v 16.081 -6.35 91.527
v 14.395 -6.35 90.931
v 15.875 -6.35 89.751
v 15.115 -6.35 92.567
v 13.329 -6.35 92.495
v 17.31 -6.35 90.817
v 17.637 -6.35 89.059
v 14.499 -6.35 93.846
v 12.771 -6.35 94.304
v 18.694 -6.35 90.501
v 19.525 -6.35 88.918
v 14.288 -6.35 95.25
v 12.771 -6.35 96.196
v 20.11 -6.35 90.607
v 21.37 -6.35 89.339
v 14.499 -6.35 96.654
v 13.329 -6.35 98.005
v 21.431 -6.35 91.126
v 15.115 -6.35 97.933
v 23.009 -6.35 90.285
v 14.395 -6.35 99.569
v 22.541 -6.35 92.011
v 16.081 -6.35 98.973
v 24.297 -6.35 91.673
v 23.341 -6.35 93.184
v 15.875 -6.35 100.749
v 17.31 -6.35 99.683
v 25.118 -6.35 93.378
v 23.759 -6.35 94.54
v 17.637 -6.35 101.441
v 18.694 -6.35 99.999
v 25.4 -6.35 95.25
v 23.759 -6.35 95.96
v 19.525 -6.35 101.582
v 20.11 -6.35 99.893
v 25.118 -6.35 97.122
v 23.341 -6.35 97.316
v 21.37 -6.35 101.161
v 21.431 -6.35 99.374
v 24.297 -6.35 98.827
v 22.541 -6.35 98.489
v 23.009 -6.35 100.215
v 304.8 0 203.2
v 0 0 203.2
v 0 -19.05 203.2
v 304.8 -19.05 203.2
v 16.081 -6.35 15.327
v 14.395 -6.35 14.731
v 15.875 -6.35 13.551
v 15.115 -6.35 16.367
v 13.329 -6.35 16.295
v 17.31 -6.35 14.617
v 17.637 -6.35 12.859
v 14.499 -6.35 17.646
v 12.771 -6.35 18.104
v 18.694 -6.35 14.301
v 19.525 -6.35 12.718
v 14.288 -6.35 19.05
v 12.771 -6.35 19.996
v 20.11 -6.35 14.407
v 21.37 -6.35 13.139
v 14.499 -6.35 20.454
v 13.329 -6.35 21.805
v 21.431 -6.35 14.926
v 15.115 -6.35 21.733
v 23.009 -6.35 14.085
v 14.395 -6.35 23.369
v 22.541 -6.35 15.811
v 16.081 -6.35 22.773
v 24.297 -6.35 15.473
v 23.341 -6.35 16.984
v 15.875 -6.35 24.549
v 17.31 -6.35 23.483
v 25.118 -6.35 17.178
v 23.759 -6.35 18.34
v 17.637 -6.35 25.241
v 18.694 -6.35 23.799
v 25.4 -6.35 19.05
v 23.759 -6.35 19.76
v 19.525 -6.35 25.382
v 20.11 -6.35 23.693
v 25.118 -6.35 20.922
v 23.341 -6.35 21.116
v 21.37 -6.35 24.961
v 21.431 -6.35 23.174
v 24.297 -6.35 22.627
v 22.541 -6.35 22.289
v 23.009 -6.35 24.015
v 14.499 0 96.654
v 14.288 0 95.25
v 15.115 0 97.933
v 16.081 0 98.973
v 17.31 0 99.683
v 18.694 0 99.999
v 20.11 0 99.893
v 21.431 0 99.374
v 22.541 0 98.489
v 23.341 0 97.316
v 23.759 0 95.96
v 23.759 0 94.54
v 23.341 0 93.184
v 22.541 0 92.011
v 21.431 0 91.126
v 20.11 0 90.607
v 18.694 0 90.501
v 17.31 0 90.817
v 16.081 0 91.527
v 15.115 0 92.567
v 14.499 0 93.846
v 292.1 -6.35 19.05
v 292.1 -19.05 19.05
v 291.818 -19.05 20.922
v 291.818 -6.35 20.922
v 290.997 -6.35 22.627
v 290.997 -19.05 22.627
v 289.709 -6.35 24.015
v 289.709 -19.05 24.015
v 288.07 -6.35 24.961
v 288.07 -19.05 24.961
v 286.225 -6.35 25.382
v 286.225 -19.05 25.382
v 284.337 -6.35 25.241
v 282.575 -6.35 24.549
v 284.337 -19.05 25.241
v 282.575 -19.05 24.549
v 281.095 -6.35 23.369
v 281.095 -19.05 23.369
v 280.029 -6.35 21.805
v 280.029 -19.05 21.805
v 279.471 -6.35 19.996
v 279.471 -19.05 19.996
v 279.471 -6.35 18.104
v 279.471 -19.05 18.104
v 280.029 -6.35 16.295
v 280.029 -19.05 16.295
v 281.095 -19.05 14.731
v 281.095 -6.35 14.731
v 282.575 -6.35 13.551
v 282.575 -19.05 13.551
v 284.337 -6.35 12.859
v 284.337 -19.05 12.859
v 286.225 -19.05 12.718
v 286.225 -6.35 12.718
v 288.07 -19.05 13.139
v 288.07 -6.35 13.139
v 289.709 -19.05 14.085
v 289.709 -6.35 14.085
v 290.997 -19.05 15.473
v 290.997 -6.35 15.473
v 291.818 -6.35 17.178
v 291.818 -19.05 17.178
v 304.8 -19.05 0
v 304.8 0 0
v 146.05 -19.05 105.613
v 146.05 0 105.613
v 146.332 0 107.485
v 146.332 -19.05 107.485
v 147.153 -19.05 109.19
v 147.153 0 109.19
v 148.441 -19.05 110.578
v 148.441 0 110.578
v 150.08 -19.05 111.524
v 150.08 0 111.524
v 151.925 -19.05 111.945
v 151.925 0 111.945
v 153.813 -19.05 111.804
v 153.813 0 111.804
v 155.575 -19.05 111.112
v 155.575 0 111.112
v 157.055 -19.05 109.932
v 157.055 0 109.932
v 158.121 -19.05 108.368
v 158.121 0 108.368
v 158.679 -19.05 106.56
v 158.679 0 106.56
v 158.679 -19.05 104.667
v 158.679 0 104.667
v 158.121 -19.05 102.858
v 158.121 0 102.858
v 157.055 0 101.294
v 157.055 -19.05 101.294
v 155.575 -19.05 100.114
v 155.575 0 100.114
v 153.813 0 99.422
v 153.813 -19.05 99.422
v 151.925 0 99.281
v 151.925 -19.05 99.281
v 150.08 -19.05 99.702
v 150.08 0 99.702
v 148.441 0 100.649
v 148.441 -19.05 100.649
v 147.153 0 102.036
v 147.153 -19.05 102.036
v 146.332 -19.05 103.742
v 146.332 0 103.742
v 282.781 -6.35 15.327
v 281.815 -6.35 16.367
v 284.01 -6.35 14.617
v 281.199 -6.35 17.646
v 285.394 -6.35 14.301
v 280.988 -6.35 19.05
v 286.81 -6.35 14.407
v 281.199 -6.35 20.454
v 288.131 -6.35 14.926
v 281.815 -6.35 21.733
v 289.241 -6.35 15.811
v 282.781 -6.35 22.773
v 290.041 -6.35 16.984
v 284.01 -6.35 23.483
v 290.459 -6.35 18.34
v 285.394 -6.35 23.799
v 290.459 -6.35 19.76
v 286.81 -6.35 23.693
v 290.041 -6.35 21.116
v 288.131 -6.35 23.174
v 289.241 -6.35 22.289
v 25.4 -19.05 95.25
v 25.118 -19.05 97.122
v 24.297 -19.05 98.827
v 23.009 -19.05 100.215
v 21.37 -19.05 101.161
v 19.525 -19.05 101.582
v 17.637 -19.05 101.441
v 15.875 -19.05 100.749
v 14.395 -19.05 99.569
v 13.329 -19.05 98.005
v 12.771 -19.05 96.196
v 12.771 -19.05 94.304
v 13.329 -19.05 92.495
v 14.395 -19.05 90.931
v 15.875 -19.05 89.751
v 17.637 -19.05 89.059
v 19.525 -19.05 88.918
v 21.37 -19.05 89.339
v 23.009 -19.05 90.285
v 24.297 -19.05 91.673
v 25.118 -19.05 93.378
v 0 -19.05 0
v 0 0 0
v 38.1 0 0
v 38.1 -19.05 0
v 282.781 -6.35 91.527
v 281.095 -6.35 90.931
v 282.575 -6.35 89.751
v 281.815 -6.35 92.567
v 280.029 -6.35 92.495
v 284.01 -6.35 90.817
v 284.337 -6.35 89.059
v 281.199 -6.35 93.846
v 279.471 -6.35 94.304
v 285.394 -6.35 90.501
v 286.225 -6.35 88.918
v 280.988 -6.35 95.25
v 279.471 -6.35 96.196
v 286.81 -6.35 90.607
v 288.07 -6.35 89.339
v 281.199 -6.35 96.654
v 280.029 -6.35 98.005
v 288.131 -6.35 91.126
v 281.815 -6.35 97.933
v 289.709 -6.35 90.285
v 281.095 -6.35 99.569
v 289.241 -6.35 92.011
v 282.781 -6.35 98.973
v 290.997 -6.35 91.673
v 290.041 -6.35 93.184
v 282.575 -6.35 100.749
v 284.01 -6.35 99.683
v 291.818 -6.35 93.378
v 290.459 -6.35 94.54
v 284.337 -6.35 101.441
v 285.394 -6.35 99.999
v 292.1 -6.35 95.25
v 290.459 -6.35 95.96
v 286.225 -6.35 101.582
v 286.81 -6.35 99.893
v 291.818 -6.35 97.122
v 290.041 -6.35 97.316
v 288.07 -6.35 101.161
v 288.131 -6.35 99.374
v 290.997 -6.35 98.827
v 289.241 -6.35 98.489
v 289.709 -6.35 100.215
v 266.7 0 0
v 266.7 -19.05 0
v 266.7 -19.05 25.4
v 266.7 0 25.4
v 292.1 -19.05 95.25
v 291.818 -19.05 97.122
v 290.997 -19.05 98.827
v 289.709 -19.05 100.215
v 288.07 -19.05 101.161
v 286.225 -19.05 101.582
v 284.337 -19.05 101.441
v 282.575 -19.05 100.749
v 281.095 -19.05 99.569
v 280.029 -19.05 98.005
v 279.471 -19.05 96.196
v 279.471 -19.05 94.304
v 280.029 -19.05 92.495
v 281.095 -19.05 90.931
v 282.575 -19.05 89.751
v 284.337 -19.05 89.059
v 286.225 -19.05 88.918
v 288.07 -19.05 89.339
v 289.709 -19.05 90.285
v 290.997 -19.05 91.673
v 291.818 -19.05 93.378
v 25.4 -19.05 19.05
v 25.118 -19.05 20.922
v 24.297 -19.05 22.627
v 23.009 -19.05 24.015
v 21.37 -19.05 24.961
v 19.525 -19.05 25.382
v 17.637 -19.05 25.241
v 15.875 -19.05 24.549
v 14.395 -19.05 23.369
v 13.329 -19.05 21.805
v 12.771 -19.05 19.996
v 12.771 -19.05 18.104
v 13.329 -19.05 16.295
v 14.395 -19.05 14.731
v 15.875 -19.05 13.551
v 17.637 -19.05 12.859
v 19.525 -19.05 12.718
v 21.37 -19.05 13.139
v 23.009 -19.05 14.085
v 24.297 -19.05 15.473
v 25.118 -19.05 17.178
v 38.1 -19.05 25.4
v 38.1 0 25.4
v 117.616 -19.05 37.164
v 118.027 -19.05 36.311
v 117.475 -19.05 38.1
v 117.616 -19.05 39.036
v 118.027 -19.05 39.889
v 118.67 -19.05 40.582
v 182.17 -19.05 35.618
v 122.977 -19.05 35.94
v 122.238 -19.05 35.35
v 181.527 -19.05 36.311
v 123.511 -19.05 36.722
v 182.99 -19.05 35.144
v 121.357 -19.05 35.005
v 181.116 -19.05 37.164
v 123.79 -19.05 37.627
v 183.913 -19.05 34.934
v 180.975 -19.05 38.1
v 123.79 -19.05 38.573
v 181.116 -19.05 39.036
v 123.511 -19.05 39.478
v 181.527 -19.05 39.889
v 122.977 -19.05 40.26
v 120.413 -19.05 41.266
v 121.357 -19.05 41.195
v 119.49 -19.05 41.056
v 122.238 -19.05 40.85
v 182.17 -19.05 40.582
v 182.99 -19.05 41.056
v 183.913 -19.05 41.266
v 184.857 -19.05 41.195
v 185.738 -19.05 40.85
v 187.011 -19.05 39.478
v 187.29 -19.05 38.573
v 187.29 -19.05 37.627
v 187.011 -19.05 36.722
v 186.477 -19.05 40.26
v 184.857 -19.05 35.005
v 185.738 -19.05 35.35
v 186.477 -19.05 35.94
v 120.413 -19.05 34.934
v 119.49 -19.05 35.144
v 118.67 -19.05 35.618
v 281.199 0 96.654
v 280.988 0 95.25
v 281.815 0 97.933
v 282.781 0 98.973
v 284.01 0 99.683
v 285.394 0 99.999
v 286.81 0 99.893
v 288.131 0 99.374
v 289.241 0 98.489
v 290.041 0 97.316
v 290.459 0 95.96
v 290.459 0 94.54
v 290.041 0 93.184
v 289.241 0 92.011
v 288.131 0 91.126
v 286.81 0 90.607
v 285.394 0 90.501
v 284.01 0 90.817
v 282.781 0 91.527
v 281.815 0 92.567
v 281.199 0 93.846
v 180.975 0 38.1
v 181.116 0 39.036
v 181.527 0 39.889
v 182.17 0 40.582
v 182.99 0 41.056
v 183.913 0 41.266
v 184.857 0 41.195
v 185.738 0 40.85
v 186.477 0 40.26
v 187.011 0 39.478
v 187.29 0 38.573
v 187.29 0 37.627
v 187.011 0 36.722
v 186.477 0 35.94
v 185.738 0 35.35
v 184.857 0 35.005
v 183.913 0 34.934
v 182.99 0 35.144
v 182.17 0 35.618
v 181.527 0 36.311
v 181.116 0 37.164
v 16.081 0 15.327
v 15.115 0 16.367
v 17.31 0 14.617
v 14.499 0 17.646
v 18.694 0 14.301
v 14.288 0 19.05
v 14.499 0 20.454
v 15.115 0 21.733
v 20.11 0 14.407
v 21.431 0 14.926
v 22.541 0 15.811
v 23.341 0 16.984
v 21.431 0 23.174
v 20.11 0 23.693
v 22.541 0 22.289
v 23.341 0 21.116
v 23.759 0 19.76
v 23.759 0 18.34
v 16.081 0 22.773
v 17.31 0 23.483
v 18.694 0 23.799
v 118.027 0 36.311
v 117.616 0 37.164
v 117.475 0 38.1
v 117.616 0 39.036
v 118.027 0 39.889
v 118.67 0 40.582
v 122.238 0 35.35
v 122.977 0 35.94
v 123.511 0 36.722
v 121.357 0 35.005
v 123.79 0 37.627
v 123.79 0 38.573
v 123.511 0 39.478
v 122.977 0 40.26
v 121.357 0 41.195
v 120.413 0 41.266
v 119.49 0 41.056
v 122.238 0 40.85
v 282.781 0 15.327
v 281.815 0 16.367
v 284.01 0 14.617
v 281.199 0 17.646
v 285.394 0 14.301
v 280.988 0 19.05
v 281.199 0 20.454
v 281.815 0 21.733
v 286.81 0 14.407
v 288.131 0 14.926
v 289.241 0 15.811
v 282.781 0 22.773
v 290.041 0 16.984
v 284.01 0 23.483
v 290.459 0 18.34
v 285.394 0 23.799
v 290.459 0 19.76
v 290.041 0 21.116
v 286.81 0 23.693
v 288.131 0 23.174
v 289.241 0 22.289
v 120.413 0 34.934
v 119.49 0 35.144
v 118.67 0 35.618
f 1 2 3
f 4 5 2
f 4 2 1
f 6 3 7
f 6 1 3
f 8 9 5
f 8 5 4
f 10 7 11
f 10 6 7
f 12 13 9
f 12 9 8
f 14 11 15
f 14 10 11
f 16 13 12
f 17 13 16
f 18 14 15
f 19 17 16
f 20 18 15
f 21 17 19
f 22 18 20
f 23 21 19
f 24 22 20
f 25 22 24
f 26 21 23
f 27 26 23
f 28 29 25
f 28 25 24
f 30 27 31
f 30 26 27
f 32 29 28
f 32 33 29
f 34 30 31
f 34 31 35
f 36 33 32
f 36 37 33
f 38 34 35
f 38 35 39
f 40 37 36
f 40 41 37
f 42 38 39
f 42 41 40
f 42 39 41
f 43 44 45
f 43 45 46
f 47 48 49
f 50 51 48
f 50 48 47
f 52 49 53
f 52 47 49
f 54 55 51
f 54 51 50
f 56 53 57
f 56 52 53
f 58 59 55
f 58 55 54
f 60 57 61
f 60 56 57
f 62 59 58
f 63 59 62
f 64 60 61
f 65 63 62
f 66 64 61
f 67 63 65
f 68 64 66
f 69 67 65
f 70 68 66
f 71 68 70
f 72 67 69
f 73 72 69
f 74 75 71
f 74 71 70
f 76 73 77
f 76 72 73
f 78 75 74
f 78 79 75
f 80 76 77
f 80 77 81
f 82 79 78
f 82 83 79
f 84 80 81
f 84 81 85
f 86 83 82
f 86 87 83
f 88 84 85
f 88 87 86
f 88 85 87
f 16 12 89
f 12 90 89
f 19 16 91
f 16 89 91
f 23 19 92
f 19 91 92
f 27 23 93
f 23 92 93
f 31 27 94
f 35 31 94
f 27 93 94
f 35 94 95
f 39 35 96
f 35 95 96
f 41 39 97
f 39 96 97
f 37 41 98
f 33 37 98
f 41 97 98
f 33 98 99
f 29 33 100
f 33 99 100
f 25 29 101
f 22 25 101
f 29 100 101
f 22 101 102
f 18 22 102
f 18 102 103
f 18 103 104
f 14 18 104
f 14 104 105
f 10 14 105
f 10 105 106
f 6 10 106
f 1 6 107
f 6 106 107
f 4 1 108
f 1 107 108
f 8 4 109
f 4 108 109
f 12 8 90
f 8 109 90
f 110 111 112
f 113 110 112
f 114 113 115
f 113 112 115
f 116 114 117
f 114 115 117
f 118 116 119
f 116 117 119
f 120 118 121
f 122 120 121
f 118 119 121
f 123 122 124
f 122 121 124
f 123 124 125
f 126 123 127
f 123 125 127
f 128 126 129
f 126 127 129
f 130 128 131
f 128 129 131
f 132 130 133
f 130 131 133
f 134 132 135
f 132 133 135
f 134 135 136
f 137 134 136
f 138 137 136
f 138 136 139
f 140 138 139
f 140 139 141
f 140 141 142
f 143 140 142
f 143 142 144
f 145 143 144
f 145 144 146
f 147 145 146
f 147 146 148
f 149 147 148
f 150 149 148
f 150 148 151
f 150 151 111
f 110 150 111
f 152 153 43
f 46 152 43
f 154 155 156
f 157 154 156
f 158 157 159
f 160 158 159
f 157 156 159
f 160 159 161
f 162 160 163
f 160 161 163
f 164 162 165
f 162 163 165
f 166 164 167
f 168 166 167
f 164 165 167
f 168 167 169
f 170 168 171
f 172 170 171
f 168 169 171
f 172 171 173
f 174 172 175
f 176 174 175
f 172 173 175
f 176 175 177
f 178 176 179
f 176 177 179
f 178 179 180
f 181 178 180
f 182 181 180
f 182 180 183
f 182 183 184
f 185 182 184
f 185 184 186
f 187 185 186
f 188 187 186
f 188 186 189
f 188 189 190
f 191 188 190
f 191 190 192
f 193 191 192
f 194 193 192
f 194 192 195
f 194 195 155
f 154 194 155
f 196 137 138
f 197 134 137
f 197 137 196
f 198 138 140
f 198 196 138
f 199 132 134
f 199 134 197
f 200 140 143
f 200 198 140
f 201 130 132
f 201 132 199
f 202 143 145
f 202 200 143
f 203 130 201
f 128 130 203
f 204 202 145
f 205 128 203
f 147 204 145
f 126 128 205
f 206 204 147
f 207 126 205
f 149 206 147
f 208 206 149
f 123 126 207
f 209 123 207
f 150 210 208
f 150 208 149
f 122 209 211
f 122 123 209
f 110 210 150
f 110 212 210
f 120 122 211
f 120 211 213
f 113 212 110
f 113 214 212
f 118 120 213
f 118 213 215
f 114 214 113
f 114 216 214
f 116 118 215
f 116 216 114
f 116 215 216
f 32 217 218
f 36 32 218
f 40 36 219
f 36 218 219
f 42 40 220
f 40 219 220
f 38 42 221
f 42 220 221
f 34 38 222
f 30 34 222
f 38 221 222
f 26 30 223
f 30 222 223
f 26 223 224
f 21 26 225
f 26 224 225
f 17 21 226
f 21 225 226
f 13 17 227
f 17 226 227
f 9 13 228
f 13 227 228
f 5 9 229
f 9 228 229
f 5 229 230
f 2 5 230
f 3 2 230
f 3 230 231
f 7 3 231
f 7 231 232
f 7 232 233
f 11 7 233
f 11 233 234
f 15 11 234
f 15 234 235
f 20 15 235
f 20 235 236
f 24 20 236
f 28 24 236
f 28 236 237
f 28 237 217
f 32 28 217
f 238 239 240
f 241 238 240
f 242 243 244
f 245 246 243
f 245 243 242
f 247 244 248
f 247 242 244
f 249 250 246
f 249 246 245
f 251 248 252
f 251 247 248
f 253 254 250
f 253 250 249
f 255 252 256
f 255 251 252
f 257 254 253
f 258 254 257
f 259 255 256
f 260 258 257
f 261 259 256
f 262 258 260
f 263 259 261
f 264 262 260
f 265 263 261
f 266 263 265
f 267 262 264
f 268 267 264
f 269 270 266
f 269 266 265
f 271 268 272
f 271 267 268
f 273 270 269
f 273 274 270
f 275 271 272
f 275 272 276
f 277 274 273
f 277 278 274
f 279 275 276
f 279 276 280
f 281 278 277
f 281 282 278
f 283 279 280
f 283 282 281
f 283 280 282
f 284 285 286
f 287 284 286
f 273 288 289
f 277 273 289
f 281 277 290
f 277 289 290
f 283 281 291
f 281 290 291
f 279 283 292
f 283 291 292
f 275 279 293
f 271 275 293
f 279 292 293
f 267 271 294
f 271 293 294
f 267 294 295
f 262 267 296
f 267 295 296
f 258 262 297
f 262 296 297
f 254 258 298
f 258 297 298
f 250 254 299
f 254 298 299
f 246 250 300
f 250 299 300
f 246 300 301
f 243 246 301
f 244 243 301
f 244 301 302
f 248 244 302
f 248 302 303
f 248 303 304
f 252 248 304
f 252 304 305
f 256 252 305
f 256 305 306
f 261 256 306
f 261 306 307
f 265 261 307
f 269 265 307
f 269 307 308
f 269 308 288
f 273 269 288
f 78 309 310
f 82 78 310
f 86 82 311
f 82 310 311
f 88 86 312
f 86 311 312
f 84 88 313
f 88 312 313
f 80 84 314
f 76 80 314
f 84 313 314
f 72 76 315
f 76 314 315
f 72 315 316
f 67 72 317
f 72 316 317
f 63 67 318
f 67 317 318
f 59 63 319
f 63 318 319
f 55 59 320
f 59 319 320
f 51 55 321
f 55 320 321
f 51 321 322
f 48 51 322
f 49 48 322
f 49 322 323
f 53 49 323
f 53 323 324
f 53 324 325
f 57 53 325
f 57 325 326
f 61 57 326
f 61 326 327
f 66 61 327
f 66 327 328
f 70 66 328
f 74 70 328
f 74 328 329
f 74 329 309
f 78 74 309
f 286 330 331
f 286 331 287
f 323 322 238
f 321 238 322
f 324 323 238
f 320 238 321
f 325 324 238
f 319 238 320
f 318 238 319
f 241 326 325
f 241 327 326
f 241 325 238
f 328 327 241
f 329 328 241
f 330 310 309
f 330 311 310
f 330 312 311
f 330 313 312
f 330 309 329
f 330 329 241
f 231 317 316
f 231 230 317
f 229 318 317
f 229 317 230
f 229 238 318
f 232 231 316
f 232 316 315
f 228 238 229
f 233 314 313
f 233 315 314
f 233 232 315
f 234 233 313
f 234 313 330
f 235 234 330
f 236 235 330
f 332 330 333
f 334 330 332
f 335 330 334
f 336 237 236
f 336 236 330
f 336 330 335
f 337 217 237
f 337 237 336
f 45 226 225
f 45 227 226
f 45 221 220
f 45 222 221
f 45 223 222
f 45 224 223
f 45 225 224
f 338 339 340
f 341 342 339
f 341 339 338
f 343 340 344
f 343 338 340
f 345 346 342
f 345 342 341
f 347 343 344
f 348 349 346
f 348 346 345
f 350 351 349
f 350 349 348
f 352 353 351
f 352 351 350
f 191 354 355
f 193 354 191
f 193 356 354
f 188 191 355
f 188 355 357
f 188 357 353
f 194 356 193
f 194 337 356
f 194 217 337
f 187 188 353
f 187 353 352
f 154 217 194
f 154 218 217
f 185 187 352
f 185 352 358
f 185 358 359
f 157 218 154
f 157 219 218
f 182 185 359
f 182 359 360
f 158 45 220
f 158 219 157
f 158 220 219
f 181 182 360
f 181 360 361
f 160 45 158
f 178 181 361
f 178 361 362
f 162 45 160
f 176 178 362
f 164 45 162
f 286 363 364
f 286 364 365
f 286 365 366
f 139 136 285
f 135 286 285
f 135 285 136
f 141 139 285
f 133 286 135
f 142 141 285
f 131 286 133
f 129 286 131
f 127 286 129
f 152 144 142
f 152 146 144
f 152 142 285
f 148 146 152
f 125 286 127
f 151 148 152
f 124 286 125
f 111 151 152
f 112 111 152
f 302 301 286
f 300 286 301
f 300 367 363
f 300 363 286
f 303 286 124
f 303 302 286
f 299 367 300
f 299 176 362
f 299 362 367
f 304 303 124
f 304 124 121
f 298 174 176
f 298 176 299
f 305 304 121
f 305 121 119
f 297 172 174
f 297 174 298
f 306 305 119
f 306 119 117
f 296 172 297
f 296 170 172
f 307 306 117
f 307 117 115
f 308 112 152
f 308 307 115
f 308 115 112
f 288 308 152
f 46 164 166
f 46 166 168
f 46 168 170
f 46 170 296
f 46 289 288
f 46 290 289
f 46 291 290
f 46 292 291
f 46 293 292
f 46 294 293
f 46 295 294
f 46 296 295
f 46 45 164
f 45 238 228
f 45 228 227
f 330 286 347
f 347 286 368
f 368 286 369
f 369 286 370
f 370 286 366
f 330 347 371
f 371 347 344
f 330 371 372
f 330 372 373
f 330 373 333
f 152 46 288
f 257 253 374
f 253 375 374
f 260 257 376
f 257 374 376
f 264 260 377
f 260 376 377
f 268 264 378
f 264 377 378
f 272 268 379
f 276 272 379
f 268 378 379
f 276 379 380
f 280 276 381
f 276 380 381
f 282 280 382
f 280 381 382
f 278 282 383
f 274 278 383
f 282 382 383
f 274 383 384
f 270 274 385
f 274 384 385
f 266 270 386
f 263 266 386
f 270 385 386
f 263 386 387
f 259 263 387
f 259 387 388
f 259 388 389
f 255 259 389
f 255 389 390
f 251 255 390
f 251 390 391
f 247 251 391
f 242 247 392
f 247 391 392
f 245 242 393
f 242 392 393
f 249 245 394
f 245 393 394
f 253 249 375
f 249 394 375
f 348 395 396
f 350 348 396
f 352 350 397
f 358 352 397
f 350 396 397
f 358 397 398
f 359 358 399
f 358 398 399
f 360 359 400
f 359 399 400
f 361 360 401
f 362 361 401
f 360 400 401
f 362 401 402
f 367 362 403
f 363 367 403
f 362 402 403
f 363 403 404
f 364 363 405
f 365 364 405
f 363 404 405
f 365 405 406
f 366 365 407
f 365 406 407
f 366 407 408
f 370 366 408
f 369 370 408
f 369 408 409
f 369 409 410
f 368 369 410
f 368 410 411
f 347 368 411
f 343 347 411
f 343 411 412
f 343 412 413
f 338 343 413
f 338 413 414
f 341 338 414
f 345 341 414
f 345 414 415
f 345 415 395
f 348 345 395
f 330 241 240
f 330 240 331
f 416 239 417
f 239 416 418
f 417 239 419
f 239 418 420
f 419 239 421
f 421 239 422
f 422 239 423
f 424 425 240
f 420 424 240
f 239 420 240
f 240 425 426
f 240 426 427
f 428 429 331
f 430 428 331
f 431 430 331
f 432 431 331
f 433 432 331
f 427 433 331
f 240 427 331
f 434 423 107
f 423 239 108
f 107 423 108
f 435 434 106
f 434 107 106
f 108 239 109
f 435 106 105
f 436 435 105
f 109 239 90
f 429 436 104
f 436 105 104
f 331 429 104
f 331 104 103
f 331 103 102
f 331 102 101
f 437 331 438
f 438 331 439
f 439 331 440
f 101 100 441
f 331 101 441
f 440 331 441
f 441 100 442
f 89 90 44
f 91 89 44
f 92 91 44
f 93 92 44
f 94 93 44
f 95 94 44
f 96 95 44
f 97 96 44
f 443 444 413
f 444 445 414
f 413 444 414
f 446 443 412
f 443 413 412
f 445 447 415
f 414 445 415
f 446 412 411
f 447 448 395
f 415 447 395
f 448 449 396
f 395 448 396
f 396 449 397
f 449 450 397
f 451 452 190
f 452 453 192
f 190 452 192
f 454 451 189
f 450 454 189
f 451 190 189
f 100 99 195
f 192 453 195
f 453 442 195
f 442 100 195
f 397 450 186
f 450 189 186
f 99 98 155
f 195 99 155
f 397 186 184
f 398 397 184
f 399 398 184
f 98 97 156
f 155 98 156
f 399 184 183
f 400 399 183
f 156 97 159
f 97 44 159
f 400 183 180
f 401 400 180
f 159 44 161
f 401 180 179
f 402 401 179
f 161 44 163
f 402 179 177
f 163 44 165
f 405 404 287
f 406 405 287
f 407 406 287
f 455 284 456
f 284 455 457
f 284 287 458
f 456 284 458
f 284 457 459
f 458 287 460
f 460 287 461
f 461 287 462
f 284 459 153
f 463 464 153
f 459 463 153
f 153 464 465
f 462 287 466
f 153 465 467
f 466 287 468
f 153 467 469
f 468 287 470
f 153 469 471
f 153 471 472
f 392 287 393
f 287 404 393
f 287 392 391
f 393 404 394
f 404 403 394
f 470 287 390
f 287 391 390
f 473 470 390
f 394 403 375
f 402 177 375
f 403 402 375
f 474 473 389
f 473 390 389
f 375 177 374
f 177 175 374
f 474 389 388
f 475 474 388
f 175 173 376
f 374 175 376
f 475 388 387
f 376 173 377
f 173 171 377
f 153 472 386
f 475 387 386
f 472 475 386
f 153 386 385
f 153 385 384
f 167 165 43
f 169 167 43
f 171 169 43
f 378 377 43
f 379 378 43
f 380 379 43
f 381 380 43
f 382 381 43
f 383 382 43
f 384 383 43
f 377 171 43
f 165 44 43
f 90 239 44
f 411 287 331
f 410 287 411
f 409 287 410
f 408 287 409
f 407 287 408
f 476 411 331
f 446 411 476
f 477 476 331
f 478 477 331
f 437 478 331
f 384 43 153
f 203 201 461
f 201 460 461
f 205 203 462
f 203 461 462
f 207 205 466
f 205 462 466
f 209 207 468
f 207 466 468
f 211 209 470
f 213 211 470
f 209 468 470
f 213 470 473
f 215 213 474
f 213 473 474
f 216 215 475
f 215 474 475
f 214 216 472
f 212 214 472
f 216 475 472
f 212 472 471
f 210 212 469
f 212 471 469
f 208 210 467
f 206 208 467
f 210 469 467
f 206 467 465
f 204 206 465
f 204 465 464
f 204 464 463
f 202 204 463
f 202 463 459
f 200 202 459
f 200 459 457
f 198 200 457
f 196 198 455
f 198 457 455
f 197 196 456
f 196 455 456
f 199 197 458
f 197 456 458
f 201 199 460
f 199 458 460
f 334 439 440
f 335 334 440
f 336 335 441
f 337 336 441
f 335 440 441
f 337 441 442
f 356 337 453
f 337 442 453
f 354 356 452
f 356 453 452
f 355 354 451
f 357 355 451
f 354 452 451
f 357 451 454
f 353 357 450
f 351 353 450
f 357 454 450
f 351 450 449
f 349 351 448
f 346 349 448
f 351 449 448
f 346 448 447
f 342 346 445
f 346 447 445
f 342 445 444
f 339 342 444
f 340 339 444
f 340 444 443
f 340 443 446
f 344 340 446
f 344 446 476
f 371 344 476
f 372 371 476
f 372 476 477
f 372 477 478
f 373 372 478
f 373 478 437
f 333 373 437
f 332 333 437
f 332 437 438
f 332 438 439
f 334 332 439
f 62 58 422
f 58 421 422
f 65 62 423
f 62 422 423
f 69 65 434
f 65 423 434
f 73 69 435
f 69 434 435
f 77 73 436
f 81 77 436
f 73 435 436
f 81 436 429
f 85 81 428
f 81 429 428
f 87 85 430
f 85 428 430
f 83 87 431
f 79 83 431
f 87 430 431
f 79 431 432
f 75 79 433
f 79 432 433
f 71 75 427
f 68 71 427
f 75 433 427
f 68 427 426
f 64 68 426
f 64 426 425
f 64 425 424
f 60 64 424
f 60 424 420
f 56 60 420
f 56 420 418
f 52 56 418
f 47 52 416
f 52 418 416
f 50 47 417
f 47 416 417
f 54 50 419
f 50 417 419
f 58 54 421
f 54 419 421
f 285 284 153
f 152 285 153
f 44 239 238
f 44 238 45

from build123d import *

# Parameters (mm, degrees)
F0_W           = 304.8
F0_H           = 203.2
F1_DEPTH       = 19.05
F2_W           = 228.6
F2_H           = 25.4
F3_DEPTH       = 19.051
F5_D           = 6.35
F7_D           = 12.7
F9_D           = 9.525
F9_CBORE_D     = 12.7
F9_CBORE_DEPTH = 12.7


with BuildPart() as f1:
    # F0 (on Front) → F1 (new body)
    with BuildSketch(Plane.XZ):
        with Locations((152.4, 101.6)):
            Rectangle(F0_W, F0_H)
    extrude(amount=F1_DEPTH)

    # F2 (on face) → F3 (cut, through all)
    with BuildSketch(Plane.XZ.offset(19.05)):
        with Locations((152.4, 12.7)):
            Rectangle(F2_W, F2_H)
    extrude(amount=-F3_DEPTH, mode=Mode.SUBTRACT)

    # F5 (through all)
    with Locations(Plane.XZ.offset(19.05)):
        with Locations((120.65, 38.1), (184.15, 38.1)):
            Hole(F5_D / 2)

    # F7 (through all)
    with Locations(Plane.XZ.offset(19.05)):
        with Locations((152.4, 105.6132)):
            Hole(F7_D / 2)

    # F9 (through all)
    with Locations(Plane.XZ.offset(19.05)):
        with Locations((19.05, 19.05), (19.05, 95.25), (285.75, 19.05), (285.75, 95.25)):
            CounterBoreHole(F9_D / 2, F9_CBORE_D / 2, F9_CBORE_DEPTH)


solid = f1.part
